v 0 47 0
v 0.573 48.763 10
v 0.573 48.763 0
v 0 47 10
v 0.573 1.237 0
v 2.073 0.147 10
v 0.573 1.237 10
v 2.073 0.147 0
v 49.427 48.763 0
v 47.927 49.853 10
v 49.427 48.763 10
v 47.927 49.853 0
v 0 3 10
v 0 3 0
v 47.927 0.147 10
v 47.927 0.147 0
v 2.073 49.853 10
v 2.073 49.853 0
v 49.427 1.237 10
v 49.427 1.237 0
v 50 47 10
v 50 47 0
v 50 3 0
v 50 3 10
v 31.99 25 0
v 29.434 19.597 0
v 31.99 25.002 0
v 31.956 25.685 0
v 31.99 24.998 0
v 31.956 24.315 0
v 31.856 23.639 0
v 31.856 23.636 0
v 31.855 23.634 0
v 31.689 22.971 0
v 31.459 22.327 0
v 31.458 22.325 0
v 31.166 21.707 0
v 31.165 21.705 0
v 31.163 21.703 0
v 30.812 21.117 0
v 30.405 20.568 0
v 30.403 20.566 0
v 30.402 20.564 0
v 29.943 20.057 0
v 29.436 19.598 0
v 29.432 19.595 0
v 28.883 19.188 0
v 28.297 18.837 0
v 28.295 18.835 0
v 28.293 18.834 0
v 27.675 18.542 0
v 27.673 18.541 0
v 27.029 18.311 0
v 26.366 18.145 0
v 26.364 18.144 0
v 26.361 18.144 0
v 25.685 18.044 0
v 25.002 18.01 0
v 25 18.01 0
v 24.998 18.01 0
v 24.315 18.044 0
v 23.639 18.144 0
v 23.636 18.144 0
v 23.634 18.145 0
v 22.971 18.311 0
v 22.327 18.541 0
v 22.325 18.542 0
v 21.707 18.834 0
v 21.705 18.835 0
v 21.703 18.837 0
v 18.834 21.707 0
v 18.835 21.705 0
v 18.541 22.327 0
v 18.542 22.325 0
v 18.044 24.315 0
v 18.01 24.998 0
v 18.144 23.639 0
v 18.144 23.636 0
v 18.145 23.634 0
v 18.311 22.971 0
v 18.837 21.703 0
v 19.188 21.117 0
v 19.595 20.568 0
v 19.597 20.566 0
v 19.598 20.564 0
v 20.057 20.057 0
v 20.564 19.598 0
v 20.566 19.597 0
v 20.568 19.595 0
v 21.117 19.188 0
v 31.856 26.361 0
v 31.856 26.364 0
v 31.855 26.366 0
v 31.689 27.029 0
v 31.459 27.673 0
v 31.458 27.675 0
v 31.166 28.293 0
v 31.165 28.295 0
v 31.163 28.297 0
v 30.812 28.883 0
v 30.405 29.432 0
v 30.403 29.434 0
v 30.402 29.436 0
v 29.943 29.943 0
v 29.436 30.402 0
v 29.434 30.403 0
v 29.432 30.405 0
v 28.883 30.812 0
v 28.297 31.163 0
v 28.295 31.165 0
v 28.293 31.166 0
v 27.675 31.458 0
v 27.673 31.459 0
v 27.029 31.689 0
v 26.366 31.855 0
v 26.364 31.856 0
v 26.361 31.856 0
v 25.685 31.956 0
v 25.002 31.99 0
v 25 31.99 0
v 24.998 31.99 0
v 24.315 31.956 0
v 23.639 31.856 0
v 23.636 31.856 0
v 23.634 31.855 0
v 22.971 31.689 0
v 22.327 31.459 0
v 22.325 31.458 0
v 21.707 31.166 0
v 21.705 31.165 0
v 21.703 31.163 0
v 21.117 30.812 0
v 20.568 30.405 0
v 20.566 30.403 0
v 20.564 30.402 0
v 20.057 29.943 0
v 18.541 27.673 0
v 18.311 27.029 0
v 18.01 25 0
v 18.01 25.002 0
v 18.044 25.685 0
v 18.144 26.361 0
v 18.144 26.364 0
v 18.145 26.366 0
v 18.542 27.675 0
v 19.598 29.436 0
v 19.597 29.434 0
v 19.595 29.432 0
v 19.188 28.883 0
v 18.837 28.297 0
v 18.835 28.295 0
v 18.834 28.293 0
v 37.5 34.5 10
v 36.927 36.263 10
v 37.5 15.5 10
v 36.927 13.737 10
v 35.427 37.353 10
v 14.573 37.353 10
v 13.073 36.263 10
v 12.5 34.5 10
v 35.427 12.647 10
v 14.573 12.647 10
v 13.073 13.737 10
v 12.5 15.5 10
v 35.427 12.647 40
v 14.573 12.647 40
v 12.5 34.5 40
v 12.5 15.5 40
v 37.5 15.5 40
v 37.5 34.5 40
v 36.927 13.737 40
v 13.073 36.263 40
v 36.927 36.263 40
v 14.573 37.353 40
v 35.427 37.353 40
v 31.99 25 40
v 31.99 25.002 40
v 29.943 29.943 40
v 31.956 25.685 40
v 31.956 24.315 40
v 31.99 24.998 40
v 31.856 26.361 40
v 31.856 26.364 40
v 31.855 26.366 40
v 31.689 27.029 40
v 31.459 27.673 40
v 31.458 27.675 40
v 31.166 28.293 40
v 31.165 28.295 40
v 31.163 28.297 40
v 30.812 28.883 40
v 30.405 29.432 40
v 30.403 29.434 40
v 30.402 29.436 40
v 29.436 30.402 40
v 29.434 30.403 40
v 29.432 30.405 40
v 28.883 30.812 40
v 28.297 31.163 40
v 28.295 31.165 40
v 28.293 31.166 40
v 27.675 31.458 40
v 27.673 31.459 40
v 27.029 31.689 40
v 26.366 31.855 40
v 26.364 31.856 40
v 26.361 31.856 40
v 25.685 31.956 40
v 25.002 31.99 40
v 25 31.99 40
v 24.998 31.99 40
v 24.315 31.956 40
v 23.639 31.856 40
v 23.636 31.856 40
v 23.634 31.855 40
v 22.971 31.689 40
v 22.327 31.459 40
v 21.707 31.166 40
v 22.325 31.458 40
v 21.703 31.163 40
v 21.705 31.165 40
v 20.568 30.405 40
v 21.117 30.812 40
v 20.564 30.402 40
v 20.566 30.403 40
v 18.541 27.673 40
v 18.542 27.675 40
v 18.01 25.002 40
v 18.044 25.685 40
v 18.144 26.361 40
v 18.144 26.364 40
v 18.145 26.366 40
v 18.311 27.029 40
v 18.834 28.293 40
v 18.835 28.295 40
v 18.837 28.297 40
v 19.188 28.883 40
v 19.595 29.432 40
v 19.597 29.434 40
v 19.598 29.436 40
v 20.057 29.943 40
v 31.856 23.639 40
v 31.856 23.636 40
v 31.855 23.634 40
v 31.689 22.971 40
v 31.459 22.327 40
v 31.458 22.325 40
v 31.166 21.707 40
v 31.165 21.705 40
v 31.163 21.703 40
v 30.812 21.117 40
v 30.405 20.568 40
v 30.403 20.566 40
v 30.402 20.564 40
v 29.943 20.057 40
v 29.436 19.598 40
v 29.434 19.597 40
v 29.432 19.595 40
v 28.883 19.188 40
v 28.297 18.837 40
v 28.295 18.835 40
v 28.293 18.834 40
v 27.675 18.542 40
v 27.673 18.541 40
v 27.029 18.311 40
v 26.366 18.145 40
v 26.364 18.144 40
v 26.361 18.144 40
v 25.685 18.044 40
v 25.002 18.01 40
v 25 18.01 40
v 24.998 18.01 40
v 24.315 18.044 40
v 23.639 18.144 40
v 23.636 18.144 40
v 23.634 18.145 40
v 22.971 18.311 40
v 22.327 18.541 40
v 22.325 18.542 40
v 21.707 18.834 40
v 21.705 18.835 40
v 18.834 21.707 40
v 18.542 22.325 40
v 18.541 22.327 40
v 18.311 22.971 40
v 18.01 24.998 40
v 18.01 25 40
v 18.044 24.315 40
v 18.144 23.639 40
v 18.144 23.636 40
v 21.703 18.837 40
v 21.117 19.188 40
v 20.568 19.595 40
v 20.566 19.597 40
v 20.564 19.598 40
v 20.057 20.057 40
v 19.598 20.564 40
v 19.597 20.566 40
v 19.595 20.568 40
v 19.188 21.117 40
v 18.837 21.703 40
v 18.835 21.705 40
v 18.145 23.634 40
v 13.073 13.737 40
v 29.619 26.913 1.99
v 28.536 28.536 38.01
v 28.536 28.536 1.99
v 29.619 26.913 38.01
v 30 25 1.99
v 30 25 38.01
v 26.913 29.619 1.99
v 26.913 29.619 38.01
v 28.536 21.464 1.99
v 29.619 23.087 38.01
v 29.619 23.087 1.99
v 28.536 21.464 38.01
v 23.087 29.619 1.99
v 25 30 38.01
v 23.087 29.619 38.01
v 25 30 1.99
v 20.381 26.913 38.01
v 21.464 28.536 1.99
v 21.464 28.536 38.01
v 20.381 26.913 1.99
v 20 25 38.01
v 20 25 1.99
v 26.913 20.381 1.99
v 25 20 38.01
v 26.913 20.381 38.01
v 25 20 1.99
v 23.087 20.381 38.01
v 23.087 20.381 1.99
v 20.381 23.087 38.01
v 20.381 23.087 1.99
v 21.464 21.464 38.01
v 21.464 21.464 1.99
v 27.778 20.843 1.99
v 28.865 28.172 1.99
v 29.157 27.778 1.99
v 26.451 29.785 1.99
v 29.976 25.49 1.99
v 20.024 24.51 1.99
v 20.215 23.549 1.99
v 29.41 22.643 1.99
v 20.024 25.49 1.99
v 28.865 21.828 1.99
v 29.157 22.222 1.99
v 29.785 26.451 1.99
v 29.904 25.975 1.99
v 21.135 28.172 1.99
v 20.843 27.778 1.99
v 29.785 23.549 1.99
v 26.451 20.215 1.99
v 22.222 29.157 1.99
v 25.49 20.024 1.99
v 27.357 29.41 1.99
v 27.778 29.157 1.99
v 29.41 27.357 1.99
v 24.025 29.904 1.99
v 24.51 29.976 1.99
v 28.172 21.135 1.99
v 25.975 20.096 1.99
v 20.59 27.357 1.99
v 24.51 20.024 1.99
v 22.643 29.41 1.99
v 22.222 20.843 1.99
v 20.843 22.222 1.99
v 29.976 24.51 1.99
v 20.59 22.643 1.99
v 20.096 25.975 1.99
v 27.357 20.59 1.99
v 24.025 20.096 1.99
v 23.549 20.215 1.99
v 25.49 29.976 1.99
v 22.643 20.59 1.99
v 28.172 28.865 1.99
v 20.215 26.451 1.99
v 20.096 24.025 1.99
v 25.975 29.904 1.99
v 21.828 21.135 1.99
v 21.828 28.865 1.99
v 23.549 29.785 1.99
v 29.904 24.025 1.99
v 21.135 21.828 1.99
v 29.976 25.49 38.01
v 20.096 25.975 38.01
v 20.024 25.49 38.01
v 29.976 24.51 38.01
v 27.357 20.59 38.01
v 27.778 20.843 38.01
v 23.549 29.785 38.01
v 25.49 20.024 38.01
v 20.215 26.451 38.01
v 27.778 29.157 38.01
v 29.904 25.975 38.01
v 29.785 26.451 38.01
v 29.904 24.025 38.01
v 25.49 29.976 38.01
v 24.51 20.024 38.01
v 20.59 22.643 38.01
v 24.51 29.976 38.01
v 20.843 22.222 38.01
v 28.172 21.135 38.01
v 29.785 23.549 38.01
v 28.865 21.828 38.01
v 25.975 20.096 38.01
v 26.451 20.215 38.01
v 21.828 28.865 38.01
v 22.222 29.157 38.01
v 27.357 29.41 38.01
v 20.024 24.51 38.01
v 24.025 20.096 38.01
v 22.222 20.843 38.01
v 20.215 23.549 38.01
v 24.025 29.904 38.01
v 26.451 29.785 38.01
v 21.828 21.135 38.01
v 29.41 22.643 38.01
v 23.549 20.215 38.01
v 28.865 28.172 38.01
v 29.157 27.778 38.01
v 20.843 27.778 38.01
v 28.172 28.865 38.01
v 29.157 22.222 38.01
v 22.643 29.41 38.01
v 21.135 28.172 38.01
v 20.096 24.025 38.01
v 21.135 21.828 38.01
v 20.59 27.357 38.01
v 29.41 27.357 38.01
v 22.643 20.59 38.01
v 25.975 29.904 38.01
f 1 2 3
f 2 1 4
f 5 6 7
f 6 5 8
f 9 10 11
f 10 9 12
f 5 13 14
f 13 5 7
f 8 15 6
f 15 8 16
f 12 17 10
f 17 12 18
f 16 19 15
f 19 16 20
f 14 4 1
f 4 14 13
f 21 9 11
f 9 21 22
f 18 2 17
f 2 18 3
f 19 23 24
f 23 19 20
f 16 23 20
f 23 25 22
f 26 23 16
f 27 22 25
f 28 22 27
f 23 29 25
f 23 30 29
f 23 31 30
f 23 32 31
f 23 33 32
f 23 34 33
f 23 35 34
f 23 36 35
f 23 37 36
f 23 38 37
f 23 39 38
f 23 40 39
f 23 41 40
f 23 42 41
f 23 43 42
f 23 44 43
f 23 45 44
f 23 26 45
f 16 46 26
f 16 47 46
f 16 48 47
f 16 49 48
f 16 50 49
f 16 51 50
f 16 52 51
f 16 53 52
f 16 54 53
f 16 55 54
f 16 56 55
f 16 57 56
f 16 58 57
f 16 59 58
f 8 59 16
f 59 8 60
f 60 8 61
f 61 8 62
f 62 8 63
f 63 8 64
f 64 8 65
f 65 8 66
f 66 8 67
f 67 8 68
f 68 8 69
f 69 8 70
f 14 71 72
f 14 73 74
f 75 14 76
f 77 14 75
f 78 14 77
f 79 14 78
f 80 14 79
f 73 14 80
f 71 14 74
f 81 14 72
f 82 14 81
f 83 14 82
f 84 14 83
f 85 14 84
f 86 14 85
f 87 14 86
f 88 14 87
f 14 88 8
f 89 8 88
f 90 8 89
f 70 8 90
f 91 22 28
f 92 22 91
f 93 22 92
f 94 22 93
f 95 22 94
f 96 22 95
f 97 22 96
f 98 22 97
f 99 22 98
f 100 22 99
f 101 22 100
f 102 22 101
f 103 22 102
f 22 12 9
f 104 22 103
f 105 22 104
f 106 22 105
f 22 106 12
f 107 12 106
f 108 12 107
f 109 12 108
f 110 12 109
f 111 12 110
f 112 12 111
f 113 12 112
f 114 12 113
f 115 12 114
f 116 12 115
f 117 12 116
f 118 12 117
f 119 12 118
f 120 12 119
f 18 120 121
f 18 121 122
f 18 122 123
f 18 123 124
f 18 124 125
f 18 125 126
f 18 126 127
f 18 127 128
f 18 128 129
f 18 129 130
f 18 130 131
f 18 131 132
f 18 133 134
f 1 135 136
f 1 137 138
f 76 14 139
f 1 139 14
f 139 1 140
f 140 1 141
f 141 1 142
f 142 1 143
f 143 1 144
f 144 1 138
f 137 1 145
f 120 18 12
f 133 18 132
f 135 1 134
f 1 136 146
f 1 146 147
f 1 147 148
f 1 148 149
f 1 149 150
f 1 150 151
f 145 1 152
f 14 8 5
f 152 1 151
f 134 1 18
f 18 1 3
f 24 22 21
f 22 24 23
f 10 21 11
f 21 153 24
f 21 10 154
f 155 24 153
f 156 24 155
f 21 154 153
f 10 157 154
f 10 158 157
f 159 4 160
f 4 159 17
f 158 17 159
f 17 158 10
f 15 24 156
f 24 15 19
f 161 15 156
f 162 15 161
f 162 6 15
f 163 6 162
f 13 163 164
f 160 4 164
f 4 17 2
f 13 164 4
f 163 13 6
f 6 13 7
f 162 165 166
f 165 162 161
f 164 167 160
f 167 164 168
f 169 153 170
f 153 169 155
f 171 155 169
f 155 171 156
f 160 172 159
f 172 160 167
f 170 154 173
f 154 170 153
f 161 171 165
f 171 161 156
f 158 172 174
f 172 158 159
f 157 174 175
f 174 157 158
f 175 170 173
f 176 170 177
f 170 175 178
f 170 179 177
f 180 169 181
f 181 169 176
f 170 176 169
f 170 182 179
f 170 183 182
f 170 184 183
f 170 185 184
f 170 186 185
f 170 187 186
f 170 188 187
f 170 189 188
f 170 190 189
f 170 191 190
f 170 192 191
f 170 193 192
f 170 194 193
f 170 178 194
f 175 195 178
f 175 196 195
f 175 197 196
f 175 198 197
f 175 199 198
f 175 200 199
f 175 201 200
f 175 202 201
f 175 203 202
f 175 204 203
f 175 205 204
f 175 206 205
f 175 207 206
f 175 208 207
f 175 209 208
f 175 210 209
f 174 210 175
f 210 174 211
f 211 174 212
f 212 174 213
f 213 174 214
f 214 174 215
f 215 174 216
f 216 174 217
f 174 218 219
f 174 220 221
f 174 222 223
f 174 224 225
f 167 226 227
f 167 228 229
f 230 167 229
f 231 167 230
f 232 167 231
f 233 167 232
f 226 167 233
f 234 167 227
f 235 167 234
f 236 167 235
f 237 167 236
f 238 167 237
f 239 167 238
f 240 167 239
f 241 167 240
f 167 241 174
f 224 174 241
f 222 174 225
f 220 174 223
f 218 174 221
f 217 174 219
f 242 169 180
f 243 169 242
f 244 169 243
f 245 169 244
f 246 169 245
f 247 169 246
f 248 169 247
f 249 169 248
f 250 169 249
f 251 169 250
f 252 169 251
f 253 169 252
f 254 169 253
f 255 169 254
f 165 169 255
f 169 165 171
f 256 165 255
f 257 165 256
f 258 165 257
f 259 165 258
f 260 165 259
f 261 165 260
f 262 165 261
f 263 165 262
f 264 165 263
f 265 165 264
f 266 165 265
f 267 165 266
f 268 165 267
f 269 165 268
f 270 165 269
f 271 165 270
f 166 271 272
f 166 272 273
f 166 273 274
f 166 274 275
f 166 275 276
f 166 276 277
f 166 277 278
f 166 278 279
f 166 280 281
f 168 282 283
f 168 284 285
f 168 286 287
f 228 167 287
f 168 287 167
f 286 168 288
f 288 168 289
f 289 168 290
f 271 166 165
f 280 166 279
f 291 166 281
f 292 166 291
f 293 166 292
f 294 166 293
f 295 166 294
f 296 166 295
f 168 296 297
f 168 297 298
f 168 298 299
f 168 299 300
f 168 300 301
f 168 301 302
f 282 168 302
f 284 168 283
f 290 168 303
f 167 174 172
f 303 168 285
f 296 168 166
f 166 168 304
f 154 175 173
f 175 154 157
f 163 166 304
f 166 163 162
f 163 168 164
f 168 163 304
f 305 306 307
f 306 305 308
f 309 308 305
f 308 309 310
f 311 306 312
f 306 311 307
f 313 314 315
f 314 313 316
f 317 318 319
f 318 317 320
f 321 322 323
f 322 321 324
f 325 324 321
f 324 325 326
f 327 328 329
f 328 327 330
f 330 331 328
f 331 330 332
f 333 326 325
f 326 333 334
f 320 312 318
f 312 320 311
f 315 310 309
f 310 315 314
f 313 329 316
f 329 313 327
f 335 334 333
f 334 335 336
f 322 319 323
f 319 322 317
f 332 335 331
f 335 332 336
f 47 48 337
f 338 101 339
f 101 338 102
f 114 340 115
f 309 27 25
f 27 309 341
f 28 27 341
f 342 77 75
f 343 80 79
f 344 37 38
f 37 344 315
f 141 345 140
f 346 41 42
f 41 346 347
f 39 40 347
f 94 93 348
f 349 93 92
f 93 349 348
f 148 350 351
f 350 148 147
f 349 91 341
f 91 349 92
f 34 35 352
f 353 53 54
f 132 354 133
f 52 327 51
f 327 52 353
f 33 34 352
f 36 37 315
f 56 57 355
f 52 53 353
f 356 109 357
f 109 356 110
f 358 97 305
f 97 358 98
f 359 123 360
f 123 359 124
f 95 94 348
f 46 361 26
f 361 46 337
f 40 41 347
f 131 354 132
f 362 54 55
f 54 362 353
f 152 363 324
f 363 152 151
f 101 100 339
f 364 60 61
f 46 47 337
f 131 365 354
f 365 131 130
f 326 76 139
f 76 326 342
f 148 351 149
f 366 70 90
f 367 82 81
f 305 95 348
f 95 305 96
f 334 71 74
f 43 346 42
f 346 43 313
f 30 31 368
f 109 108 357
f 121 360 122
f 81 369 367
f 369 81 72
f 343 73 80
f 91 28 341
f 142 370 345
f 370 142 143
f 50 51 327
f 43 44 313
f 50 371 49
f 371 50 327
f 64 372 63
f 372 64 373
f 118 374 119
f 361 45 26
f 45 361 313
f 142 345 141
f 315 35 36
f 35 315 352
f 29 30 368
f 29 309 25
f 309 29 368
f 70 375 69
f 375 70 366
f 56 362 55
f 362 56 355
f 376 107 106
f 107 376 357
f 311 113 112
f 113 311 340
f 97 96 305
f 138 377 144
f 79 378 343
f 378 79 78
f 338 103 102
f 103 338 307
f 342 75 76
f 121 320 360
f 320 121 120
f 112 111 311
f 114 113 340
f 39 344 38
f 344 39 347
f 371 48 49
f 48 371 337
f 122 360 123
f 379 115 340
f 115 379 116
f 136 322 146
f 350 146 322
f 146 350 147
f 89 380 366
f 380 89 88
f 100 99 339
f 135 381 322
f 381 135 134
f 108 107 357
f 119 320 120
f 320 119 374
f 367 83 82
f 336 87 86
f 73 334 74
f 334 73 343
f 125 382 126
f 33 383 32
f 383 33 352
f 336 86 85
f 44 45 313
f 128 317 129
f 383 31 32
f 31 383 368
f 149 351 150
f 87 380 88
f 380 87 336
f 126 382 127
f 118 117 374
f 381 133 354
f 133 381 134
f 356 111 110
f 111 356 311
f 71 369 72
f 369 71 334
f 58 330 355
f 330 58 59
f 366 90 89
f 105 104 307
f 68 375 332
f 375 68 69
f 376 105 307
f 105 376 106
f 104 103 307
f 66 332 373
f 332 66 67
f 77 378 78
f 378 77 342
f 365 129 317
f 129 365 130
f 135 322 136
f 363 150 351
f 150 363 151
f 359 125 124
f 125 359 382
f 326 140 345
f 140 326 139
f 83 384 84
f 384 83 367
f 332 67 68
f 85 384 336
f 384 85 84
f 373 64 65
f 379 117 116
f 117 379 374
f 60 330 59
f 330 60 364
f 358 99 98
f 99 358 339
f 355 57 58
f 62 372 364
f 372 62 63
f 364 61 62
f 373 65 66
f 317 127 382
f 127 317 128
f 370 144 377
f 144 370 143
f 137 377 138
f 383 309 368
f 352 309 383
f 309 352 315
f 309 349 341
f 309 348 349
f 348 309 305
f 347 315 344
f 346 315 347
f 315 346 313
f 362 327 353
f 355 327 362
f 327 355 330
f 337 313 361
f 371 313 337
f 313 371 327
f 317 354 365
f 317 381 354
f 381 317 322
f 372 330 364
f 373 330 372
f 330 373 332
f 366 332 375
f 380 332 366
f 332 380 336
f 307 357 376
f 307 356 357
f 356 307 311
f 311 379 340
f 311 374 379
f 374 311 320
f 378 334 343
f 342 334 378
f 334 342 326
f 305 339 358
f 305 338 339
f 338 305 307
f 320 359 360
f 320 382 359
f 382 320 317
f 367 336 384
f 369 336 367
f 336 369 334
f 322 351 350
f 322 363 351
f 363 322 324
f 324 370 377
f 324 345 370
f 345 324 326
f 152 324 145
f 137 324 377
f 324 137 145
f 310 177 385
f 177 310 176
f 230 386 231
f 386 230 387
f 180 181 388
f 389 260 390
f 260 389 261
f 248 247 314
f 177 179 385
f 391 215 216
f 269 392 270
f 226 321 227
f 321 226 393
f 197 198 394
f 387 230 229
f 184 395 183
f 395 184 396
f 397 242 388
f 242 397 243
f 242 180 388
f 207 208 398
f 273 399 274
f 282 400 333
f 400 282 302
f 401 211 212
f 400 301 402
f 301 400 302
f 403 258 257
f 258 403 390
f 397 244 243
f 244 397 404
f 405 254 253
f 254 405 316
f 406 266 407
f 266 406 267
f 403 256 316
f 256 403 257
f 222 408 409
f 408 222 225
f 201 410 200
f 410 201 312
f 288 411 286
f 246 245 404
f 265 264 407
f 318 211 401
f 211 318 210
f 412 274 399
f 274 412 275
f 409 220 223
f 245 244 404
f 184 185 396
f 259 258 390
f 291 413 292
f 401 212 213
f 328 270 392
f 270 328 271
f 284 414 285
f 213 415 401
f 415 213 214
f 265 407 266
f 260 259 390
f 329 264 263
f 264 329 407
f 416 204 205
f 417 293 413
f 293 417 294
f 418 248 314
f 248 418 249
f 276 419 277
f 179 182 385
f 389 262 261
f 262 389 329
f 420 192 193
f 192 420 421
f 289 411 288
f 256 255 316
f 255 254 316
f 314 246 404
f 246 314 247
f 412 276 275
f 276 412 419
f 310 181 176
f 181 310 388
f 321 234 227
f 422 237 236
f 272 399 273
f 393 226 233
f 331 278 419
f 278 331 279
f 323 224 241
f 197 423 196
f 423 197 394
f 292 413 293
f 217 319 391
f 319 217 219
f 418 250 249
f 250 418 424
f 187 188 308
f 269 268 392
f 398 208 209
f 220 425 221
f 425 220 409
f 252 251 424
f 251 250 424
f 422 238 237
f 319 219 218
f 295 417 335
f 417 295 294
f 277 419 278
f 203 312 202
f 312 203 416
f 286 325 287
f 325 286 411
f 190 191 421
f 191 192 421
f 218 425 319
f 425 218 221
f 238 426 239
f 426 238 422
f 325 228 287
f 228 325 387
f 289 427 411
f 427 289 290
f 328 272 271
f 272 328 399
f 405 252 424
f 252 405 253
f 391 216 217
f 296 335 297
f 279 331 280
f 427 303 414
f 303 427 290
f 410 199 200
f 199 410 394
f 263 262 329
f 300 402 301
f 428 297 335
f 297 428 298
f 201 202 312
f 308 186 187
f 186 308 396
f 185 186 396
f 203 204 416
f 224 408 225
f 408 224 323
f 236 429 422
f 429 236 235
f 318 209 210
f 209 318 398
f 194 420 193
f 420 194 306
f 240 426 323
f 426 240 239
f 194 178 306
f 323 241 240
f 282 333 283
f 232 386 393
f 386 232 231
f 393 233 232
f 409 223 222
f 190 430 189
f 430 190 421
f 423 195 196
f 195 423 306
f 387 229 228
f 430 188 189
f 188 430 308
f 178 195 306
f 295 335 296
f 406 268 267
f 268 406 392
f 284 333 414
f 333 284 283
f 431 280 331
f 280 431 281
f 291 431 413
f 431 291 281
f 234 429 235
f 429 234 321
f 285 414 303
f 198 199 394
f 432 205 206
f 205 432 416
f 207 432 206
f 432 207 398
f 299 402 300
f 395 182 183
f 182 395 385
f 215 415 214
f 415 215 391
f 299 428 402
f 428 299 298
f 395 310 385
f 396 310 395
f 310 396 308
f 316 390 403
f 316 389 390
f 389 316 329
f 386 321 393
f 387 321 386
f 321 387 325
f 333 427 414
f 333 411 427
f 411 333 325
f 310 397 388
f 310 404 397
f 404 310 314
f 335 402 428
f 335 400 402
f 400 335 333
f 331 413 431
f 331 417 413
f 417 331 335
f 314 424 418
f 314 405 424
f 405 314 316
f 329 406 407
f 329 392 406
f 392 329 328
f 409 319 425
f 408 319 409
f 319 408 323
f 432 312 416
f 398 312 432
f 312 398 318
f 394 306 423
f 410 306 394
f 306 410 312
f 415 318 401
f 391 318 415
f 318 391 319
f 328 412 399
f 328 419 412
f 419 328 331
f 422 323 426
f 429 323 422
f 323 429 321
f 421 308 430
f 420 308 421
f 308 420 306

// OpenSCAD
/* [Shoulder] */
shoulder_x = 50;
shoulder_y = 50;
shoulder_z = 10;
shoulder_radius = 3;

/* [Core] */
core_x = 25;
core_y = 25;
core_z = 30;
core_radius = 3;

/* [Hole] */
hole_radius = 5;

/* [Countersink] */
countersink_depth = 2;
countersink_angle = 45;

module roundedcube(xdim, ydim, zdim, rdim){
    hull(){
        translate([rdim,rdim,0])cylinder(h=zdim,r=rdim);
        translate([xdim-rdim,rdim,0])cylinder(h=zdim,r=rdim);
        translate([rdim,ydim-rdim,0])cylinder(h=zdim,r=rdim);
        translate([xdim-rdim,ydim-rdim,0])cylinder(h=zdim,r=rdim);
    }
}

module countersink(radius, depth, angle=45) {
    // Creates a conical chamfer for the hole entry/exit
    cylinder(h=depth, r1=radius + depth*tan(angle), r2=radius, $fn=64);
}

// Calculate core position (centered on shoulder)
core_offset_x = (shoulder_x - core_x) / 2;
core_offset_y = (shoulder_y - core_y) / 2;

difference(){
    union(){
        roundedcube(shoulder_x, shoulder_y, shoulder_z, shoulder_radius);
        translate([core_offset_x, core_offset_y, shoulder_z])
            roundedcube(core_x, core_y, core_z, core_radius);
    }
    // Main hole
    translate([shoulder_x/2, shoulder_y/2, -1])
        cylinder(shoulder_z + core_z + 2, hole_radius, hole_radius);

    // Bottom countersink (shoulder entry)
    translate([shoulder_x/2, shoulder_y/2, -0.01])
        countersink(hole_radius, countersink_depth, countersink_angle);

    // Top countersink (core exit)
    translate([shoulder_x/2, shoulder_y/2, shoulder_z + core_z + 0.01])
        mirror([0, 0, 1])
            countersink(hole_radius, countersink_depth, countersink_angle);
}
